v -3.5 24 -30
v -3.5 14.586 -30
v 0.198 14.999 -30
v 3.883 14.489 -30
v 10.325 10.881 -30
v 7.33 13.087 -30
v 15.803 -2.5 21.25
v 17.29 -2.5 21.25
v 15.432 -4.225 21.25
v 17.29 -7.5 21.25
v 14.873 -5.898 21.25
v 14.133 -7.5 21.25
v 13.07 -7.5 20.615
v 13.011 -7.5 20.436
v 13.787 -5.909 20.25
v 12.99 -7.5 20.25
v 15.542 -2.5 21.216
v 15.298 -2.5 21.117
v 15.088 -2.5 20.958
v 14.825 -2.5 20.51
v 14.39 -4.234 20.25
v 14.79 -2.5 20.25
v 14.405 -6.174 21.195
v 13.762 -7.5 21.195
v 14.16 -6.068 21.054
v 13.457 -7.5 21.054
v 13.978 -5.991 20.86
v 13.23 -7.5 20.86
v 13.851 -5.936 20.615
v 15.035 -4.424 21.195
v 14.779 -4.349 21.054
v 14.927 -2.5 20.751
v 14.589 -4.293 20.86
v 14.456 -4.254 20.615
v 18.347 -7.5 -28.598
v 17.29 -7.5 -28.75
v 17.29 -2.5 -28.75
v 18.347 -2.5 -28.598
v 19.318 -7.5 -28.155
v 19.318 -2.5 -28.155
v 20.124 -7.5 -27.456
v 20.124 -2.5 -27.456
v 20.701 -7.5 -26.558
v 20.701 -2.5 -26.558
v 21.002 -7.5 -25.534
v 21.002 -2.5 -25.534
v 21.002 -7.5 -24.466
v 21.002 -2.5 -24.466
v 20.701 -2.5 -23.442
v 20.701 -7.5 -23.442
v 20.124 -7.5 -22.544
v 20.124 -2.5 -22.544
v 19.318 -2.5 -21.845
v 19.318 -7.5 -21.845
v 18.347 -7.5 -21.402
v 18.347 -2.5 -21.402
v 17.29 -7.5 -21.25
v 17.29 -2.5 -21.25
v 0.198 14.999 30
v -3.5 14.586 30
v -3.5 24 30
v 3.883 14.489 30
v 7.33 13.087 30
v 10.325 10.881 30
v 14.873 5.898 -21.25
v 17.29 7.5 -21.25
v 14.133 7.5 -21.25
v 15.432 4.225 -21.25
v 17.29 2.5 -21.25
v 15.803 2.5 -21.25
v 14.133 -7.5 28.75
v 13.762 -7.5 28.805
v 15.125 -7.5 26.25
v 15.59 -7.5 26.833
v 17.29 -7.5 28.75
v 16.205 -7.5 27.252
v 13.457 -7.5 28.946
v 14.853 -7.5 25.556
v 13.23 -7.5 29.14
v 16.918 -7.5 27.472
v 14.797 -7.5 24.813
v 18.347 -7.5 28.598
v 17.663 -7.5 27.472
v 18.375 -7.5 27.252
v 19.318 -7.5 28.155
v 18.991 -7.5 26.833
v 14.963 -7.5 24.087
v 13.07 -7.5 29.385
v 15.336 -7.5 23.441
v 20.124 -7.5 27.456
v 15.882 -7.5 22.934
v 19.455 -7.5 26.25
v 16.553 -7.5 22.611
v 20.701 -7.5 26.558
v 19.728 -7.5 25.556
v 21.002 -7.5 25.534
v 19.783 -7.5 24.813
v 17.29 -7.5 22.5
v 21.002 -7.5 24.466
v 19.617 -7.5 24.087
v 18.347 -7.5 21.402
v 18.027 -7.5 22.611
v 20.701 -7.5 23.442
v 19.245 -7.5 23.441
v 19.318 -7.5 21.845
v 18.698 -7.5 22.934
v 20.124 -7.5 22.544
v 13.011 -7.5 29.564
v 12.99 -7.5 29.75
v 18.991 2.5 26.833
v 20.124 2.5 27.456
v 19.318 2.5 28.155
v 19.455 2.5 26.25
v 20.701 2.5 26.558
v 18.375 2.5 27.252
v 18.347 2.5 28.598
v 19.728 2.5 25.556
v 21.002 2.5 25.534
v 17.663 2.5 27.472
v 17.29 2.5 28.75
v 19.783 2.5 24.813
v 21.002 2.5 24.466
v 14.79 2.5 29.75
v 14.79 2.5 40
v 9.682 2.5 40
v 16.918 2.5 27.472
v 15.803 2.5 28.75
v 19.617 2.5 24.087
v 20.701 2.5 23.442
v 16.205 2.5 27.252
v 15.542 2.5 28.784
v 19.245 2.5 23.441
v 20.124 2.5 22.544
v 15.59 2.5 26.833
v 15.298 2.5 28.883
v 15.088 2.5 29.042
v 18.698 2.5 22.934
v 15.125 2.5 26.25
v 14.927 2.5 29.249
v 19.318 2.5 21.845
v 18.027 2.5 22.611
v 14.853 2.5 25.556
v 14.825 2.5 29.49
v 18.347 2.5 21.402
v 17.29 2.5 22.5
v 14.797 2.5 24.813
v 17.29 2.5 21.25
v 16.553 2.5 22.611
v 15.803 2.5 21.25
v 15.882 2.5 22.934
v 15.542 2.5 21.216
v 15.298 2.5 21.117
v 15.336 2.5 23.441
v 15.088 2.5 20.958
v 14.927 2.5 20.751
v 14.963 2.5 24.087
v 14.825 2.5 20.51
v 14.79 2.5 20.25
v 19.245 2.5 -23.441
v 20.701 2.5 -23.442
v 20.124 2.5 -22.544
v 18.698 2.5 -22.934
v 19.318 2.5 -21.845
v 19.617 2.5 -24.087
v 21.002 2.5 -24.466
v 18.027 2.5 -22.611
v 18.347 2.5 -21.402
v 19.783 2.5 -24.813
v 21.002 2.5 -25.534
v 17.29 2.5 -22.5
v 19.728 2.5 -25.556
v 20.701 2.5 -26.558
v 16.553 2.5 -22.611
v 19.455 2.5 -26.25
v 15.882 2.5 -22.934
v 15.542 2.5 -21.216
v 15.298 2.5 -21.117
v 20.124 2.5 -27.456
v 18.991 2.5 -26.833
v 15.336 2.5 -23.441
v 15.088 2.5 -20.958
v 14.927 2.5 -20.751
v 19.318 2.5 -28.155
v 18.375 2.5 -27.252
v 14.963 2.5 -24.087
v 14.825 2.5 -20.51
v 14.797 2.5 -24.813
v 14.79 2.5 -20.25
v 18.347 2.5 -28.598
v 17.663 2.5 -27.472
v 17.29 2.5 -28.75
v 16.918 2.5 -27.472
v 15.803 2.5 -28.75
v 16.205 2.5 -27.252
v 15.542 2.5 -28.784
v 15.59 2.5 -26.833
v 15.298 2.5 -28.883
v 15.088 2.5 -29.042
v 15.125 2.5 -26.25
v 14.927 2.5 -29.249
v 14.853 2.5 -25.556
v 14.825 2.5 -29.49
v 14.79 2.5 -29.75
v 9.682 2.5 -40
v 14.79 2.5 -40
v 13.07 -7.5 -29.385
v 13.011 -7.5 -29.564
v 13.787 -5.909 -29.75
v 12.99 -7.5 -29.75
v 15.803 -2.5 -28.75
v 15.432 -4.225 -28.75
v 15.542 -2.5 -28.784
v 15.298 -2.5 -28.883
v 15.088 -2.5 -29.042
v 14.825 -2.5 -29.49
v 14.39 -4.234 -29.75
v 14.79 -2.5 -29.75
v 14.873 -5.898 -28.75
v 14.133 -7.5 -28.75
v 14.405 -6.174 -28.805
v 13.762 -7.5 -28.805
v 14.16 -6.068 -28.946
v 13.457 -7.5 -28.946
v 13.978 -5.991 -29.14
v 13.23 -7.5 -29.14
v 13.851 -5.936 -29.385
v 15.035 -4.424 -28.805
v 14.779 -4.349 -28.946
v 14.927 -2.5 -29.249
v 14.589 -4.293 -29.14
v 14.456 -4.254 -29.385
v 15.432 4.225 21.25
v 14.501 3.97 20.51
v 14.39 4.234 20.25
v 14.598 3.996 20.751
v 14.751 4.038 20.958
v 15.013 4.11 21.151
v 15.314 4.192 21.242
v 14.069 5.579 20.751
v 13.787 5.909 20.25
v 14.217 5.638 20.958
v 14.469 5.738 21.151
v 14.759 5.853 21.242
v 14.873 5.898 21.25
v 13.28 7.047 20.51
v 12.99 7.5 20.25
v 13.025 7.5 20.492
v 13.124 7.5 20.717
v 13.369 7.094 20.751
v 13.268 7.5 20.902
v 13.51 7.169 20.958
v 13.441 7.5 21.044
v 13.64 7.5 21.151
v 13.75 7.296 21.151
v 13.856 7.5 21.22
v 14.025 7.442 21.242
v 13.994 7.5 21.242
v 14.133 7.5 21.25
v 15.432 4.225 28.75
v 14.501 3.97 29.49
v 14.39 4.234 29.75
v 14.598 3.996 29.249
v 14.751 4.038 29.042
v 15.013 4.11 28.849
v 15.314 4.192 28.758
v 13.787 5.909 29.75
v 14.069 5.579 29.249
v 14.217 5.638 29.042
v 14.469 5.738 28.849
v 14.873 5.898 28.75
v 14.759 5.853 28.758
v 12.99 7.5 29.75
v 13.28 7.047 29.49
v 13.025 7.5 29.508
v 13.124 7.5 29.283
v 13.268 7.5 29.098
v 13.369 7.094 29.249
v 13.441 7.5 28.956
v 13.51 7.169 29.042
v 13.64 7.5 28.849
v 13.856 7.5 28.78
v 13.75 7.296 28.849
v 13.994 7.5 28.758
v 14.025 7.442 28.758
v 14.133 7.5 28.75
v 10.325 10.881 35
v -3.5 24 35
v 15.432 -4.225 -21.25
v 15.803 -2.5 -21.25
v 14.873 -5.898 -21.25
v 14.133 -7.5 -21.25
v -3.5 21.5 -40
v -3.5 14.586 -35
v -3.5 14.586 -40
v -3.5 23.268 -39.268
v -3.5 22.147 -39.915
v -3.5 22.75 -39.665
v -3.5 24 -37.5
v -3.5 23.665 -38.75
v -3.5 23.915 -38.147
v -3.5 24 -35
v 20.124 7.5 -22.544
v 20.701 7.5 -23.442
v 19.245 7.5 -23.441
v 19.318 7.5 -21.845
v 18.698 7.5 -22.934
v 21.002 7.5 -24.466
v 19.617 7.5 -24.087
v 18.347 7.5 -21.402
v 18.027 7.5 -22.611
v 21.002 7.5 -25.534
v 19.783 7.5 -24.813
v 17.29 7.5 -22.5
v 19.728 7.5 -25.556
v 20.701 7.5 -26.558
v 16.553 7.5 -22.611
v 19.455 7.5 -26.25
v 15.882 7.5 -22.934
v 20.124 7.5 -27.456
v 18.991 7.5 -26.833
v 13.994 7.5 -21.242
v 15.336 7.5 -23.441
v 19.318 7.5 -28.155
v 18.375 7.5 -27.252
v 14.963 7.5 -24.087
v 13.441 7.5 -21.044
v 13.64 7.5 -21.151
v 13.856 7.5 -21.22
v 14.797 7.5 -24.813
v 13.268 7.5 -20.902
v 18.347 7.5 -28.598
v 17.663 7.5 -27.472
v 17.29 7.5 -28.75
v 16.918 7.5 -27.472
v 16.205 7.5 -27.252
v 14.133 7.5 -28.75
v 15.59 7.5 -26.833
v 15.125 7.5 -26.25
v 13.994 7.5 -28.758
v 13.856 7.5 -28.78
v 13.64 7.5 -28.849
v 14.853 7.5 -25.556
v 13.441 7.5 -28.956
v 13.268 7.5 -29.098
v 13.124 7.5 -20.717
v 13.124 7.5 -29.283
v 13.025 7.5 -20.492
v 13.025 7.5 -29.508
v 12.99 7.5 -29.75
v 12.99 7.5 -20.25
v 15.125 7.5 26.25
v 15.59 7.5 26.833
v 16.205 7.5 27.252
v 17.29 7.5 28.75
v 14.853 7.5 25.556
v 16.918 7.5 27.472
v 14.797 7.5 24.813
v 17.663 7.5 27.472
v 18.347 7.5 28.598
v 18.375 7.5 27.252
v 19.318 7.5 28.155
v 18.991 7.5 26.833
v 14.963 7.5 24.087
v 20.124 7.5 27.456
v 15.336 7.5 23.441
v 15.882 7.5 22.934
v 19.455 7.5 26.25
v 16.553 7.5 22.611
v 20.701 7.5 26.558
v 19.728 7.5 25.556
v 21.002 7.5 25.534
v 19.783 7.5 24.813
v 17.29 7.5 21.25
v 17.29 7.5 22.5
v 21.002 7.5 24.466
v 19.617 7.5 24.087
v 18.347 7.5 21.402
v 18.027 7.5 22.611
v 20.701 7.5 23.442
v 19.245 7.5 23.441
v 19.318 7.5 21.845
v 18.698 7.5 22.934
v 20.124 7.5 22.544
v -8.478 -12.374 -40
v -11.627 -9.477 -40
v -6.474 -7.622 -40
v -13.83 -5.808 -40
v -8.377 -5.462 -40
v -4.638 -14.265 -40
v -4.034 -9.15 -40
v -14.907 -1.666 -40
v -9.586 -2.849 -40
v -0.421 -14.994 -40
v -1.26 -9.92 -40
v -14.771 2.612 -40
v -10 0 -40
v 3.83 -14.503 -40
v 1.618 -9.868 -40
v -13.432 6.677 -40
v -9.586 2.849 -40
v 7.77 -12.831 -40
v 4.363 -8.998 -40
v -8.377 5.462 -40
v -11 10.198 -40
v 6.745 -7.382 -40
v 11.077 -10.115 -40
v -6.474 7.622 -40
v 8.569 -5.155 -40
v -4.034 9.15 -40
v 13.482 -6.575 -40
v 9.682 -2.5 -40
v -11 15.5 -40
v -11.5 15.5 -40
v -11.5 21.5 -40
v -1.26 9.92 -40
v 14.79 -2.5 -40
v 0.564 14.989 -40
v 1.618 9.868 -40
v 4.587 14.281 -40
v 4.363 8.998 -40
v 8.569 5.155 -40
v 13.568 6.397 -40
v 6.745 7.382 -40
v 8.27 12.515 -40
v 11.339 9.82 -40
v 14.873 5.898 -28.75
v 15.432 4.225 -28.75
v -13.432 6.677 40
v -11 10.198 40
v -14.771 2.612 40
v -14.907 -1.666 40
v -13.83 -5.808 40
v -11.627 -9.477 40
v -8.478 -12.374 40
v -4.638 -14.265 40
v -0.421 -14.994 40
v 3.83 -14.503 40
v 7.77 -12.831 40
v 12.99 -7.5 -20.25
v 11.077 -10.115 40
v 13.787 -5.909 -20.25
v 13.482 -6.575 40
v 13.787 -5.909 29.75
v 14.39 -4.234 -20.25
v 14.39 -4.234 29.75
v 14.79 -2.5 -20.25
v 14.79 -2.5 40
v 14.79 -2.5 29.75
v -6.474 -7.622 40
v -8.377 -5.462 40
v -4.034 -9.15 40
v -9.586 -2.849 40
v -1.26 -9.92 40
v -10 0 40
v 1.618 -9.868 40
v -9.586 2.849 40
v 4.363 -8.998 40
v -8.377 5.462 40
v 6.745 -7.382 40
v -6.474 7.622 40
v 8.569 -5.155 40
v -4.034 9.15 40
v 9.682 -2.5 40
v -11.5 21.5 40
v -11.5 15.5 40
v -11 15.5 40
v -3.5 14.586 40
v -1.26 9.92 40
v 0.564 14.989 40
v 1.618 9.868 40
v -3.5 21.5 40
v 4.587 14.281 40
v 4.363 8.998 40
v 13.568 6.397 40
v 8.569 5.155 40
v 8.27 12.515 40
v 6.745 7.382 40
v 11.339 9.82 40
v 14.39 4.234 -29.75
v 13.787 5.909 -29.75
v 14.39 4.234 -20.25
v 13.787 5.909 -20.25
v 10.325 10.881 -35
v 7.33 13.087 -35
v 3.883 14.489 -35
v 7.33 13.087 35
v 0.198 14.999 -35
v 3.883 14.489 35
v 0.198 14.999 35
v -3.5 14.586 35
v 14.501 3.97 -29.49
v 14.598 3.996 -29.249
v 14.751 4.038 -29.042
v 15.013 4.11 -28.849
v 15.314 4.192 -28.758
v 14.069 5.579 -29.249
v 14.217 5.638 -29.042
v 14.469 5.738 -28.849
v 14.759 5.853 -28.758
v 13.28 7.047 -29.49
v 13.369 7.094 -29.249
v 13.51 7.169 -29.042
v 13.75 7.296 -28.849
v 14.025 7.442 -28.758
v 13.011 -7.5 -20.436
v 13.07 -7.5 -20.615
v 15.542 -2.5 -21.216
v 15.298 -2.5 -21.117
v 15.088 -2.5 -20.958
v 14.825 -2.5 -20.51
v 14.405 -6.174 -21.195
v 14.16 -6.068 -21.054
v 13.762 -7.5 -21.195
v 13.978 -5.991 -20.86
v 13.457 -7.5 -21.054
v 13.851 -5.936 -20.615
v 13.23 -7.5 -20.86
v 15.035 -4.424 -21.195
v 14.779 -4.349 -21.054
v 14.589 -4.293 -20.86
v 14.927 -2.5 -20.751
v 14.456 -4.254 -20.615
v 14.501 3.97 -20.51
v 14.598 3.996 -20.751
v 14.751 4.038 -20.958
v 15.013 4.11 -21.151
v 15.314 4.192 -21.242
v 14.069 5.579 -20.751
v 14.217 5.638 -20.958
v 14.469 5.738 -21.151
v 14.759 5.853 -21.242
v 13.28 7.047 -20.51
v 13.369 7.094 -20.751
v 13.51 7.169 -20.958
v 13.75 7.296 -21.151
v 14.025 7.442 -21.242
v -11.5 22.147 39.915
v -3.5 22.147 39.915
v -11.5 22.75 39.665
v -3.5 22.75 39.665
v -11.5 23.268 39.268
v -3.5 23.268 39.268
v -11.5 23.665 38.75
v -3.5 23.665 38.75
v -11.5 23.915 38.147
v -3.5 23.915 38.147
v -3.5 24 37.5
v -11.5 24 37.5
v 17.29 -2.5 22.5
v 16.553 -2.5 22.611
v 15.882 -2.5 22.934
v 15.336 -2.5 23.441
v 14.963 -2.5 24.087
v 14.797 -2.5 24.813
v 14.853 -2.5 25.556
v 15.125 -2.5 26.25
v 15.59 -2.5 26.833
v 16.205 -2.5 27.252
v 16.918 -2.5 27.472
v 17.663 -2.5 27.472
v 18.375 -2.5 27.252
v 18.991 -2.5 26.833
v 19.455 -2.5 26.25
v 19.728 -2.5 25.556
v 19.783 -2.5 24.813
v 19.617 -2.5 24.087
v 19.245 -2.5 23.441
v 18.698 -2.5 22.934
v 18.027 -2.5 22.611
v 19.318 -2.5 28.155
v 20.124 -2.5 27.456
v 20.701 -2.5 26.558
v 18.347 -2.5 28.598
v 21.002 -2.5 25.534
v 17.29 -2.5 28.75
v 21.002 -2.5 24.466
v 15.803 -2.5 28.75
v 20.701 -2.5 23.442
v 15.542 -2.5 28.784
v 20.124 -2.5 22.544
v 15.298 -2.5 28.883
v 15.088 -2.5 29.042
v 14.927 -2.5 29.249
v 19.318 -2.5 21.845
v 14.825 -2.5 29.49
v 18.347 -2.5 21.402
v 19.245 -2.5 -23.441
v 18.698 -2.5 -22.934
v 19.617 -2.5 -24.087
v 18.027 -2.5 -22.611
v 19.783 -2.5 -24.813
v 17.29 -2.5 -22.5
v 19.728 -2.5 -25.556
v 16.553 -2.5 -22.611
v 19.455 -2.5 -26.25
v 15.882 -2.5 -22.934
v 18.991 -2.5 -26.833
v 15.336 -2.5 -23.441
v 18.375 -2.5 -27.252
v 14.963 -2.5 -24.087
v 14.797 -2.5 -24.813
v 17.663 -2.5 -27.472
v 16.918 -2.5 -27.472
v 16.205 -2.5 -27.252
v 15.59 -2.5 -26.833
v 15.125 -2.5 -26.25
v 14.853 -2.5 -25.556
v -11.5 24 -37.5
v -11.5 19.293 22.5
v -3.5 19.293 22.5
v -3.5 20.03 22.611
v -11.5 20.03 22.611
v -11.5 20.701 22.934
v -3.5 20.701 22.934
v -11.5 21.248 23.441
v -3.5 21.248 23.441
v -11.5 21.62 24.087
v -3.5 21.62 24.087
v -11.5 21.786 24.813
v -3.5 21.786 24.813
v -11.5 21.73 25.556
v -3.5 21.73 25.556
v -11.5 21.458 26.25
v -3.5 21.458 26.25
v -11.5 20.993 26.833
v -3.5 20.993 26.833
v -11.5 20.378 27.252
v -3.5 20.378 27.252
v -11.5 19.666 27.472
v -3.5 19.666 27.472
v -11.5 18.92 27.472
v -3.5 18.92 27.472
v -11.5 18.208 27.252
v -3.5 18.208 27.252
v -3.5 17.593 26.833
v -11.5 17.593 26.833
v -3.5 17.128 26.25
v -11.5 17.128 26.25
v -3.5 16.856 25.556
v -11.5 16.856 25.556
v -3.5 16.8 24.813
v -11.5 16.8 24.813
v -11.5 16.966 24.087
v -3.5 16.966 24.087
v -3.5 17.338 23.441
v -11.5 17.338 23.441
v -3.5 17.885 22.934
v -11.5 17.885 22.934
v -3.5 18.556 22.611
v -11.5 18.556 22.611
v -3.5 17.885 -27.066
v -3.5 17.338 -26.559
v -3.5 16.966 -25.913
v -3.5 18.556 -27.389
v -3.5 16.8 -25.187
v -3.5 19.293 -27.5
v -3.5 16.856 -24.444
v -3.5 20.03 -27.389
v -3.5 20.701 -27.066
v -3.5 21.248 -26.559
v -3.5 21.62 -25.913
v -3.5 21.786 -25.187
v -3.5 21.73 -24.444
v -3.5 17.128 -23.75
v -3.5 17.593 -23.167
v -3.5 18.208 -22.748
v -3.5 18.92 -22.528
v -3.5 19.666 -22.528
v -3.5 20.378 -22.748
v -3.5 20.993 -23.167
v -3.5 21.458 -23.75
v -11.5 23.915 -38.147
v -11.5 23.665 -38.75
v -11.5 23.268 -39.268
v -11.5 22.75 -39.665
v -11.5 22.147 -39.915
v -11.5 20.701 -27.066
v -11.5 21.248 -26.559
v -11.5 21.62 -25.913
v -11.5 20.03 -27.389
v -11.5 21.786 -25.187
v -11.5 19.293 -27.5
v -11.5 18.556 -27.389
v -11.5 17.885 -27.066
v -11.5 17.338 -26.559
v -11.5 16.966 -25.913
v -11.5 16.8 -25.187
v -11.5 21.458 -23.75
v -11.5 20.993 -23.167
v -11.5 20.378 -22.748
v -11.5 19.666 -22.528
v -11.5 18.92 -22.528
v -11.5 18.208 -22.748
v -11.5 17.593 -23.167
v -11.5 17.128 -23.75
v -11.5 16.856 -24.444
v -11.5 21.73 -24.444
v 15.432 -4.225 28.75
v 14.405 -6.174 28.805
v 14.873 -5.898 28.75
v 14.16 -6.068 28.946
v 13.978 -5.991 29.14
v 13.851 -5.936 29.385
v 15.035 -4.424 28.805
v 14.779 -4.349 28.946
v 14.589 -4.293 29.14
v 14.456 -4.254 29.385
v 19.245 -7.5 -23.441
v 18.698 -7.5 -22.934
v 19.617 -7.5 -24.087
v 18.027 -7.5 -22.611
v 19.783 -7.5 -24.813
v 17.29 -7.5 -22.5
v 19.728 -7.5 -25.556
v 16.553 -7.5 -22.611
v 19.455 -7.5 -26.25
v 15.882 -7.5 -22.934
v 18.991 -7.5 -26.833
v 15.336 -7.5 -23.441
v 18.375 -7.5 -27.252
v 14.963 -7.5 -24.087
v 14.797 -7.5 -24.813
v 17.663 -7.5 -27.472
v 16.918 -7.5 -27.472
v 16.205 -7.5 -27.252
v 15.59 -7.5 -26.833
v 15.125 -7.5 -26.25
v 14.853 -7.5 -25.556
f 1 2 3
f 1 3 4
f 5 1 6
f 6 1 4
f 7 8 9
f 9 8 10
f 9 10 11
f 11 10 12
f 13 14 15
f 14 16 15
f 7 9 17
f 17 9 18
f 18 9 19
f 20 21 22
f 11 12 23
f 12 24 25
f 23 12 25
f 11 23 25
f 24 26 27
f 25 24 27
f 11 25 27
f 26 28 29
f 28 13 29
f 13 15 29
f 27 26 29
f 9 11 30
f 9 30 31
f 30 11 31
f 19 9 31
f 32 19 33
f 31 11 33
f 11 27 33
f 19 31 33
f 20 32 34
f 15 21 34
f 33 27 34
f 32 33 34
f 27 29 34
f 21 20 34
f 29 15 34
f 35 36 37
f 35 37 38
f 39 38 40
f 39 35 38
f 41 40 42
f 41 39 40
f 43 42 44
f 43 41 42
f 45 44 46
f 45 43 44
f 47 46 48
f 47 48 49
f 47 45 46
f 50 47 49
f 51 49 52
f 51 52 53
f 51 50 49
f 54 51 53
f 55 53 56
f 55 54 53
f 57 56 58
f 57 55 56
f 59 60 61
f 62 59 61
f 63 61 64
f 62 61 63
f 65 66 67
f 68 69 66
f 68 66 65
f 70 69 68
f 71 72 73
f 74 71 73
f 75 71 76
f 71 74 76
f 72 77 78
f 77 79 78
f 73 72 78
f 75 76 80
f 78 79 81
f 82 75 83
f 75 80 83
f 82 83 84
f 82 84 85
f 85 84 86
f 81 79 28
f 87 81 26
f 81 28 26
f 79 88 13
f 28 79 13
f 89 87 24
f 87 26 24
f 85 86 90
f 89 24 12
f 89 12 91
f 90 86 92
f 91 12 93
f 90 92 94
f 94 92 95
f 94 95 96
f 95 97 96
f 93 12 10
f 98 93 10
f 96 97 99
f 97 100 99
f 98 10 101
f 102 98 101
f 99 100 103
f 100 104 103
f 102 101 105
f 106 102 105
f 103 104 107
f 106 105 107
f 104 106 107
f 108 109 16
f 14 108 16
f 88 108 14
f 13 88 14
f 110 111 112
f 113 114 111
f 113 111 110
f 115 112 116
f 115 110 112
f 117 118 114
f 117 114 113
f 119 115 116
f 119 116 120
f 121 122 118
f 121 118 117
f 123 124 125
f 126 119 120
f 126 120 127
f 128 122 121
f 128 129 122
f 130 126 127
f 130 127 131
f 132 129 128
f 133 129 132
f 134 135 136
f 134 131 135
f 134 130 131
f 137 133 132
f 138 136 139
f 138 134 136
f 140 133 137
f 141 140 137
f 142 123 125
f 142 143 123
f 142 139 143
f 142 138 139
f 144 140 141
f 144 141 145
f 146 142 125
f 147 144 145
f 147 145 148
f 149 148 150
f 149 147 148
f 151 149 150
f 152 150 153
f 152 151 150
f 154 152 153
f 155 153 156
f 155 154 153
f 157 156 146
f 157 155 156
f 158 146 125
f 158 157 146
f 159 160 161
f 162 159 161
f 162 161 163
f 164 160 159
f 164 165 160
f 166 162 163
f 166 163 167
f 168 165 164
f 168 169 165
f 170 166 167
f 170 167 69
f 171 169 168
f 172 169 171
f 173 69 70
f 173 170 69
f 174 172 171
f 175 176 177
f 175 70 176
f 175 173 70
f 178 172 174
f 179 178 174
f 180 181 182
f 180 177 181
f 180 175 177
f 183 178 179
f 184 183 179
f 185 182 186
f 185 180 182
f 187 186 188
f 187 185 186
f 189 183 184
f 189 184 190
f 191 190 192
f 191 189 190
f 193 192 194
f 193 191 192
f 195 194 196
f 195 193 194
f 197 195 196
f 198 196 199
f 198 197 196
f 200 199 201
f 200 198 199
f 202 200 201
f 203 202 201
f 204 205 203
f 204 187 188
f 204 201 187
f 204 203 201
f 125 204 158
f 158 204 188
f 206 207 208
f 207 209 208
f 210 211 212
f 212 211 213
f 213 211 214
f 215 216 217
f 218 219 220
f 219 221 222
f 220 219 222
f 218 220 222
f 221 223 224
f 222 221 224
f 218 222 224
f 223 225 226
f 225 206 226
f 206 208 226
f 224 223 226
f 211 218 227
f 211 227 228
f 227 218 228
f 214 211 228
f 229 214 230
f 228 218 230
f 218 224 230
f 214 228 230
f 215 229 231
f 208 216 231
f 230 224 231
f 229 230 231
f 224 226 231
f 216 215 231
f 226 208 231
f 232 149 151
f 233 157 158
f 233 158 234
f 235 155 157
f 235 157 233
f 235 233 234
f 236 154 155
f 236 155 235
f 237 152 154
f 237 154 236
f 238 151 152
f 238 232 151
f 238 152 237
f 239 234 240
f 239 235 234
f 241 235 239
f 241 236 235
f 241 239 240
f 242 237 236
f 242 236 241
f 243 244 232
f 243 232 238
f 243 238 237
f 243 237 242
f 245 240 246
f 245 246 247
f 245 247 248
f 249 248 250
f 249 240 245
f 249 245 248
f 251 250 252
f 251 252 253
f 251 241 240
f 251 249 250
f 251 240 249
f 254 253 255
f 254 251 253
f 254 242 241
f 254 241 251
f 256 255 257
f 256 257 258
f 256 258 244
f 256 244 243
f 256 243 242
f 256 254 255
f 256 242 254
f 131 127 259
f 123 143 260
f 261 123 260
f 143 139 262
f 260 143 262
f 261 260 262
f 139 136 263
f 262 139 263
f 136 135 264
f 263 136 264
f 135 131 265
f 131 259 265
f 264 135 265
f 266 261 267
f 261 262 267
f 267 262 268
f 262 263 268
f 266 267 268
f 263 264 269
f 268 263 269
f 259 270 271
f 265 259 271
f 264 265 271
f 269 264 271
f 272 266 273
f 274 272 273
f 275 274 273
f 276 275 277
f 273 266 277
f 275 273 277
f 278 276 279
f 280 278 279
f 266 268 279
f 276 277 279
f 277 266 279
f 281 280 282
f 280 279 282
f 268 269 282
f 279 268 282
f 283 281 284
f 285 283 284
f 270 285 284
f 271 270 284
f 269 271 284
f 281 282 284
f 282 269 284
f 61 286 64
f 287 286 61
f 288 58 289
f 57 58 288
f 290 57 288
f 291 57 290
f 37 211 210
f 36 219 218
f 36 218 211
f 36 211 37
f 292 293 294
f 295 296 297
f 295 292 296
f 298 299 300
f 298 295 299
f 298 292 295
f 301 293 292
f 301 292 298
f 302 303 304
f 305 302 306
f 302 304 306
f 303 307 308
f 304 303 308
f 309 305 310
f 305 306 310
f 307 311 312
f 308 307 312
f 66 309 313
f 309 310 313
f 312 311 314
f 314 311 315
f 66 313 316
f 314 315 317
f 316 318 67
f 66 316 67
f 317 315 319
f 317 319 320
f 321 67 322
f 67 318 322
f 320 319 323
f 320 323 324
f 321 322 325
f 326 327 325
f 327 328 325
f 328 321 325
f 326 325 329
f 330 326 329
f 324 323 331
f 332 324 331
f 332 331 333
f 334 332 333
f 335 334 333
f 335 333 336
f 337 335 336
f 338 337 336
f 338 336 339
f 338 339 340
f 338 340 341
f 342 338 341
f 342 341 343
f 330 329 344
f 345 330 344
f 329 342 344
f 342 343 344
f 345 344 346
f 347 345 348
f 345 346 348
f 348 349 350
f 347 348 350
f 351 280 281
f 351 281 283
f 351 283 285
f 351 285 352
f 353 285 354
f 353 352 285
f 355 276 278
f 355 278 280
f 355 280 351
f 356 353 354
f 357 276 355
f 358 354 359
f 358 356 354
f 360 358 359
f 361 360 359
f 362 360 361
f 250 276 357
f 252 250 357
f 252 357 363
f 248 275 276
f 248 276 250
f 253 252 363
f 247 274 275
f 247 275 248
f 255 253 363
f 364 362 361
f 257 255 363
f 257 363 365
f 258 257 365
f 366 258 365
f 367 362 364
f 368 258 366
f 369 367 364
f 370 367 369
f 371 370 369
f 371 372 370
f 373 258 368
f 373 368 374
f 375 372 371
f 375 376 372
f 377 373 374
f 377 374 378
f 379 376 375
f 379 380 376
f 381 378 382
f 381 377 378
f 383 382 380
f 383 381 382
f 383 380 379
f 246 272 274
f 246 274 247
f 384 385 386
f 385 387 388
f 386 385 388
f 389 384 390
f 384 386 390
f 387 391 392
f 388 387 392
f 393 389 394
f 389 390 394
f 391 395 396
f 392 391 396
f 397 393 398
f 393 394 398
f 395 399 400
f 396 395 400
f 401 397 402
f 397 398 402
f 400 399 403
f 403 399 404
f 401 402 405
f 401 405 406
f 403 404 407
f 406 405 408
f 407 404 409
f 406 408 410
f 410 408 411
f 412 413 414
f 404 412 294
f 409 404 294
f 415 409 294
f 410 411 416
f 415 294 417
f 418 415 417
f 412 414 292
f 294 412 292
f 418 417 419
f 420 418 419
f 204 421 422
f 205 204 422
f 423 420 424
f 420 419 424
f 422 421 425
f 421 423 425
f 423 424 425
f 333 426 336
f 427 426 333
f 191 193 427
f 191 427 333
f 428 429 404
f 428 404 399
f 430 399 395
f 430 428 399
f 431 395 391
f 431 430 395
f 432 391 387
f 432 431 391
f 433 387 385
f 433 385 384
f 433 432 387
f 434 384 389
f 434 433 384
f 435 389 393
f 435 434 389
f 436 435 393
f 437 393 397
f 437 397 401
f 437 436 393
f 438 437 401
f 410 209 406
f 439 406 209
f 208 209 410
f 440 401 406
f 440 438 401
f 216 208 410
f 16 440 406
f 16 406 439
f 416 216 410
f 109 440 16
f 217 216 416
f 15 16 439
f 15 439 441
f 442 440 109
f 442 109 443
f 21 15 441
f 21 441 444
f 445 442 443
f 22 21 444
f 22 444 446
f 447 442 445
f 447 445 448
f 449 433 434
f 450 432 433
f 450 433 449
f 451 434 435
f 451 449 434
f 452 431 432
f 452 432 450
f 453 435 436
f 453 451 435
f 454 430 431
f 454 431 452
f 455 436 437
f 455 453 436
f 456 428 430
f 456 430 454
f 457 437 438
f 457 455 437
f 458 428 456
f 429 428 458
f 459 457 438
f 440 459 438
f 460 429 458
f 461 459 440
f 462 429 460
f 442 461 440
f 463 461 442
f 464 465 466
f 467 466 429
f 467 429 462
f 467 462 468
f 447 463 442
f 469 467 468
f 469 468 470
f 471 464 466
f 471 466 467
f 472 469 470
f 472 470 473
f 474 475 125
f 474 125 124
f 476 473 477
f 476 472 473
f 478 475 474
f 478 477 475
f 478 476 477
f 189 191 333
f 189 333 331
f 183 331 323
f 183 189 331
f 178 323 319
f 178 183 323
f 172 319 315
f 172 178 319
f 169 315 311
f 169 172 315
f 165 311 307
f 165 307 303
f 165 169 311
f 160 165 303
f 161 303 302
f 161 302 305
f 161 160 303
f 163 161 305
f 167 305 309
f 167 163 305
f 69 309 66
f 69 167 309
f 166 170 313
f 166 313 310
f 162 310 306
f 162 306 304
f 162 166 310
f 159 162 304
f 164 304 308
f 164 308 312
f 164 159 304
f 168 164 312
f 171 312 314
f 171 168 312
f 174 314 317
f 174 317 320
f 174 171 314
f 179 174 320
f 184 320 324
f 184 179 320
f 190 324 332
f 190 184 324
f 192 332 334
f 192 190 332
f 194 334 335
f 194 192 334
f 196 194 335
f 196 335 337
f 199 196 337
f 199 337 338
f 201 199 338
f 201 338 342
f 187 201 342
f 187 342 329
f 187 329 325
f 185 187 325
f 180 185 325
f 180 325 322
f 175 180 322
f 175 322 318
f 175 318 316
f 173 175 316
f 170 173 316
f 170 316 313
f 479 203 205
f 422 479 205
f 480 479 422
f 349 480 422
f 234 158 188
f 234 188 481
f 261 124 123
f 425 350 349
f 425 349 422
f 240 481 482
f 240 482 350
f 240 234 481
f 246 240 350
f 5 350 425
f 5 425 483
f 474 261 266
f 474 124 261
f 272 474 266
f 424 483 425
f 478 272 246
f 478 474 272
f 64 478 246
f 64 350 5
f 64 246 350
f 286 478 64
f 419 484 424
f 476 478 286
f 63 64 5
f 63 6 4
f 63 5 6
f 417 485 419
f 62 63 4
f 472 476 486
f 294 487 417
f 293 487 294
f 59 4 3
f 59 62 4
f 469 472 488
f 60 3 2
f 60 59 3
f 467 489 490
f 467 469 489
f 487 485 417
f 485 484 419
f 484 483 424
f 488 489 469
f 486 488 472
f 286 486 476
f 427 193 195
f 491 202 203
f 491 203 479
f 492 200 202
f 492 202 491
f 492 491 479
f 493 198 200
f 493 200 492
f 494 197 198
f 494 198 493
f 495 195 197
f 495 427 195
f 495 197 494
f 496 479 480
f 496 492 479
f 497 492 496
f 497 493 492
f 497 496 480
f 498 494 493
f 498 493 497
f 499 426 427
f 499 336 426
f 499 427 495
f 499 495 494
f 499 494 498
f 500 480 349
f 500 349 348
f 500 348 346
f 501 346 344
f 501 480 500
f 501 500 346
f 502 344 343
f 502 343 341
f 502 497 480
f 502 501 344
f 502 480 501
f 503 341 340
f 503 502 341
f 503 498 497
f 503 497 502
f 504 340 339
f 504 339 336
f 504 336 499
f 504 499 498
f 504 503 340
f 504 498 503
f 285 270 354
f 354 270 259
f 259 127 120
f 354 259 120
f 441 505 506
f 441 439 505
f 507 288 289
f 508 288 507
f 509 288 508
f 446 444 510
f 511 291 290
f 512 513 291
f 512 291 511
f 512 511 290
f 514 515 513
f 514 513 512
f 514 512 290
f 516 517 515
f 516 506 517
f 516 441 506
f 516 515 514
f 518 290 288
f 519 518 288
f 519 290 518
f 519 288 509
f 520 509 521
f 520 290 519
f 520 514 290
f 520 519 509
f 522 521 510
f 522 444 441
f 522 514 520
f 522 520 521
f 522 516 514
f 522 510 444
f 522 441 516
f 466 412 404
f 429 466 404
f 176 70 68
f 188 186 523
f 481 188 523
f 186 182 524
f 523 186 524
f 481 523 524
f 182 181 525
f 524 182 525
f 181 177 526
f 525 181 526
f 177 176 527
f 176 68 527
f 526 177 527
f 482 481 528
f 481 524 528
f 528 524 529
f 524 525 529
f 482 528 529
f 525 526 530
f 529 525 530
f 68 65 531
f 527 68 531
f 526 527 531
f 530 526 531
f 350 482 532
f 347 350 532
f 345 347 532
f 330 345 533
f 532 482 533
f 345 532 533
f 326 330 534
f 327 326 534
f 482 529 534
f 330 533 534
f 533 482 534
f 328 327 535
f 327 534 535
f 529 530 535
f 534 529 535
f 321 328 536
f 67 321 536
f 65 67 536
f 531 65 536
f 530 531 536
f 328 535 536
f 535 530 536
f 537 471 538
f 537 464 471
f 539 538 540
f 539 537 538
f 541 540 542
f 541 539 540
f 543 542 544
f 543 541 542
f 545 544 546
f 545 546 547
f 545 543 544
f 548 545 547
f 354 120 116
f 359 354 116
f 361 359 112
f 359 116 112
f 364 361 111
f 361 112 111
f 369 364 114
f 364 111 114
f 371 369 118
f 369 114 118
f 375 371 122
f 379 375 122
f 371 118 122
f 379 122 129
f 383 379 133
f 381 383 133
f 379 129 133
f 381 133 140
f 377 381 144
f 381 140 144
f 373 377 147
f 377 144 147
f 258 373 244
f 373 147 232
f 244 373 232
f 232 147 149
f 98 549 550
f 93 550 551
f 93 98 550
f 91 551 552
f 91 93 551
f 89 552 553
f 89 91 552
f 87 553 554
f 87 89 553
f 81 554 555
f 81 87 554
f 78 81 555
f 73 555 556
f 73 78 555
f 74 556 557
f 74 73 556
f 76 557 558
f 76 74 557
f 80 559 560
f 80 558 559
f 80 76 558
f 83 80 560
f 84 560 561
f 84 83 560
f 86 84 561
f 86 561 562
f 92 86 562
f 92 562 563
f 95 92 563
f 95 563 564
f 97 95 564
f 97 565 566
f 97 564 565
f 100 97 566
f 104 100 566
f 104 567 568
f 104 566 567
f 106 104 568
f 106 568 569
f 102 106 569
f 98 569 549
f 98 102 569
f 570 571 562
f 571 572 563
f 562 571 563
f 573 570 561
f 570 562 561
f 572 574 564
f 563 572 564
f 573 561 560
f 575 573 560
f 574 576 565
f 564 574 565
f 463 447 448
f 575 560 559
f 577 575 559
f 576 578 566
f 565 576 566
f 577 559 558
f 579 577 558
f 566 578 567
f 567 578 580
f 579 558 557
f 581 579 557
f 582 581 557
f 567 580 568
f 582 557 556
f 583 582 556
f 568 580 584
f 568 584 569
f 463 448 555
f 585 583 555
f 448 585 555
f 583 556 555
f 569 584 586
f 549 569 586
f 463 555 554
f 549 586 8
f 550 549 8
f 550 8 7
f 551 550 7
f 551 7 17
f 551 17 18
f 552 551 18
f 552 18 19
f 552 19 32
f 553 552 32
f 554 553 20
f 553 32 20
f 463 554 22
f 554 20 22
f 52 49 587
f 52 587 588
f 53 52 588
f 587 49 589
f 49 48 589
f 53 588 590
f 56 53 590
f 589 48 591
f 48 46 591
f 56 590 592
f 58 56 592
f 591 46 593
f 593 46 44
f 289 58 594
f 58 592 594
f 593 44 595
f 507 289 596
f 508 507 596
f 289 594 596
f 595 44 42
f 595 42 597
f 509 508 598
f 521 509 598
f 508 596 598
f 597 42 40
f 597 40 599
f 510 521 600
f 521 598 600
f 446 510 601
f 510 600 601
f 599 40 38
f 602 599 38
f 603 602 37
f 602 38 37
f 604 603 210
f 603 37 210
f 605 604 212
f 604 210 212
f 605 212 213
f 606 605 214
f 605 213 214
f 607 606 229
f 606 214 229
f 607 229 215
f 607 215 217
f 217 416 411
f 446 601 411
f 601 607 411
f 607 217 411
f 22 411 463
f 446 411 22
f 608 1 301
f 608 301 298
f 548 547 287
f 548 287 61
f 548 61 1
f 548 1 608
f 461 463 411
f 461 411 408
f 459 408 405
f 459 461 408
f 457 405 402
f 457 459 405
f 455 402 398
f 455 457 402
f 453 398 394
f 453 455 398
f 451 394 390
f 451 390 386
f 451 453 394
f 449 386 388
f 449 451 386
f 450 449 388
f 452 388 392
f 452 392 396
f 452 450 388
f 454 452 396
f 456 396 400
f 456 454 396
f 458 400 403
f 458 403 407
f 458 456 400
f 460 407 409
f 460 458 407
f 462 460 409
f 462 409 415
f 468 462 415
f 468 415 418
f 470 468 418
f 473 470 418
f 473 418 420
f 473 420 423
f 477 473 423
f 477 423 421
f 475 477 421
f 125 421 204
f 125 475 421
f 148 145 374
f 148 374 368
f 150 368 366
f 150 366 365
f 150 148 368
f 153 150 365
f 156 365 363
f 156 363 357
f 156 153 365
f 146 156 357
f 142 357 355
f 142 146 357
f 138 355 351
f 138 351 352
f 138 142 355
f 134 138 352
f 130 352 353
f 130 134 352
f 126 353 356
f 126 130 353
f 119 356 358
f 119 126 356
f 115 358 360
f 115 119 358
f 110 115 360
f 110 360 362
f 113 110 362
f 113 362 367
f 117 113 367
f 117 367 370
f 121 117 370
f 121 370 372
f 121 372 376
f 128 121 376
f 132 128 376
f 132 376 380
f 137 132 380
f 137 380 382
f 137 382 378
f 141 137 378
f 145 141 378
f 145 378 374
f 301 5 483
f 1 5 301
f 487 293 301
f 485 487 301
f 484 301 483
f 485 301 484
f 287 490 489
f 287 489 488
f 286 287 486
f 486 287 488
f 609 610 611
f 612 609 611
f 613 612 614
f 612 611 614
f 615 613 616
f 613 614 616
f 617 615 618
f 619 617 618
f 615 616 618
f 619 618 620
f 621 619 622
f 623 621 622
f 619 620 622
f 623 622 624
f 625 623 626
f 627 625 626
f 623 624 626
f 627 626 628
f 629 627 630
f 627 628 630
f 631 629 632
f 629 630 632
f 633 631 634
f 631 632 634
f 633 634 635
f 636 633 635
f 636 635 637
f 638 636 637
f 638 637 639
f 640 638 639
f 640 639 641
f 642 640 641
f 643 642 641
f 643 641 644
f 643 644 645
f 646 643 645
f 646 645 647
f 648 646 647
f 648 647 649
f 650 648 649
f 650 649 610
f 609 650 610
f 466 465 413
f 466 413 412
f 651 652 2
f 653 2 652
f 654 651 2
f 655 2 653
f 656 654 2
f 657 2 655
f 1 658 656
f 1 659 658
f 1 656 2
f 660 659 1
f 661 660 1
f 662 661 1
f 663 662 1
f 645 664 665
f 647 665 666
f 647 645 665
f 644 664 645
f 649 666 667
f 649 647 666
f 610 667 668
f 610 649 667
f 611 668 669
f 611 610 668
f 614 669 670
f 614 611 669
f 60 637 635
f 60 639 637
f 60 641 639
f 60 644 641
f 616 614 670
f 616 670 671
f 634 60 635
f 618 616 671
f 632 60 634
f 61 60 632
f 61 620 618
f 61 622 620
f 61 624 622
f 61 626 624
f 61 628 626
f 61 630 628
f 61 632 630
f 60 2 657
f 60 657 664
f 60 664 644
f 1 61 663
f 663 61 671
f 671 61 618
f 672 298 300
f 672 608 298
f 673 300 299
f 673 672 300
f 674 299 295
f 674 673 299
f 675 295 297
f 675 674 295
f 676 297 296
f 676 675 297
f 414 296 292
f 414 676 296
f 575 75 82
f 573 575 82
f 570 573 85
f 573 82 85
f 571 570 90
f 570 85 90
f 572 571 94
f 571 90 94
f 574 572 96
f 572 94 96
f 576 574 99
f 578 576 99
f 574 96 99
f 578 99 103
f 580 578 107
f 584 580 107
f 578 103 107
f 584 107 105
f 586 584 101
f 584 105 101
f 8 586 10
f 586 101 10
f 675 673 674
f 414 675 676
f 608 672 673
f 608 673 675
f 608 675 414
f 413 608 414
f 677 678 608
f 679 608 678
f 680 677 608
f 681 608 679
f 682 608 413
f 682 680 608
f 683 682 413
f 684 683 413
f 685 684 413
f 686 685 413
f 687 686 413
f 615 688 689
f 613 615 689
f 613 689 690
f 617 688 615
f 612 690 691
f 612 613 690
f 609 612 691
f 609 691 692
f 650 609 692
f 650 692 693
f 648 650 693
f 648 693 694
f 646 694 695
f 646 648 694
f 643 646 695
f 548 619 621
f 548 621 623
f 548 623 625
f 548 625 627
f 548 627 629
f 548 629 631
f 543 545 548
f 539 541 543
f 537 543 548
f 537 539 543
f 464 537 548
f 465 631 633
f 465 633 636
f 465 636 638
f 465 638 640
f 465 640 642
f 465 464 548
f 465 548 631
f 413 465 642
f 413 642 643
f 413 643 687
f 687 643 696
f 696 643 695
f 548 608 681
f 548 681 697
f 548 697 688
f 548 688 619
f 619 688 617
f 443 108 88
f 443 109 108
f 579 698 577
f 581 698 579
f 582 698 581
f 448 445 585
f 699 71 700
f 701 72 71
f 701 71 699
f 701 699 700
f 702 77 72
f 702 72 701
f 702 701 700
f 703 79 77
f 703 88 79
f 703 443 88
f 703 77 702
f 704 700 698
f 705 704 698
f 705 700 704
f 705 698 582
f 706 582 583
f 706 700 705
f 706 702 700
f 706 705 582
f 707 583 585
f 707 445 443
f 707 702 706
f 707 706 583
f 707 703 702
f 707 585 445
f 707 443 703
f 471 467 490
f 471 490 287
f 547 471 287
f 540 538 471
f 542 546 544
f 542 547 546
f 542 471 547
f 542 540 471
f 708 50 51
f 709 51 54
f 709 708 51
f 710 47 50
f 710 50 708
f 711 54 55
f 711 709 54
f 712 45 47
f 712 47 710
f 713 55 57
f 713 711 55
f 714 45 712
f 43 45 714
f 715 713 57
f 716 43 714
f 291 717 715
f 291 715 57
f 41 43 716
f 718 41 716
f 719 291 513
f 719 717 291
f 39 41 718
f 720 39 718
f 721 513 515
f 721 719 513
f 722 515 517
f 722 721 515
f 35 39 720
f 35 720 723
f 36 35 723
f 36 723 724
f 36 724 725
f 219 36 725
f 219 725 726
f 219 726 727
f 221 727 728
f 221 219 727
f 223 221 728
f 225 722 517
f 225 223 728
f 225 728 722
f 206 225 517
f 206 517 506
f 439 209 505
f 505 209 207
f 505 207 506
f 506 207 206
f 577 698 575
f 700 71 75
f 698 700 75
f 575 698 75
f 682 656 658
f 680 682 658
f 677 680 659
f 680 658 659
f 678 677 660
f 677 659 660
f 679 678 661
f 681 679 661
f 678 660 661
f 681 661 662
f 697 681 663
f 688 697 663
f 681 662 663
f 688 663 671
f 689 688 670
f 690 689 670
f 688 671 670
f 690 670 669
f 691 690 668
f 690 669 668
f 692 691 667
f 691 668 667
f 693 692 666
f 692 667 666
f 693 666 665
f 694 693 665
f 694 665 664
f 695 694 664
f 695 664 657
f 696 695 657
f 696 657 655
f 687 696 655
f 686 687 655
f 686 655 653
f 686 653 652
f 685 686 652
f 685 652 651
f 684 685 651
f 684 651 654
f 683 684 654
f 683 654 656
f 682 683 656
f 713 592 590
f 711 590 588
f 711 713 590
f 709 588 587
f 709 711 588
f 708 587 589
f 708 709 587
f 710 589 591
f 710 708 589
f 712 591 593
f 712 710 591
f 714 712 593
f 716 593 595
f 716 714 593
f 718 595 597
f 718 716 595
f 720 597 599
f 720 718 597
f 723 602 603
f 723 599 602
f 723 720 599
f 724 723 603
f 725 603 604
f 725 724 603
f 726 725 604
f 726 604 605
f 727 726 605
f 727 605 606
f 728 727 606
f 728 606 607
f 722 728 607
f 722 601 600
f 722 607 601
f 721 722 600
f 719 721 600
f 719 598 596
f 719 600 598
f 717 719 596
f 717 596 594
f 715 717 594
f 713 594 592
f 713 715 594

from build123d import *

# Parameters (mm, degrees)
BOSS_EXTRUDE1_DEPTH = 40
BOSS_EXTRUDE2_START = 30
BOSS_EXTRUDE2_DEPTH = 5
BOSS_EXTRUDE3_START = -35
BOSS_EXTRUDE3_DEPTH = 5
SKETCH2_R           = 2.5
CUT_EXTRUDE1_DEPTH  = 15
BOSS_EXTRUDE4_START = 2.5
SKETCH4_R           = 2.5
BOSS_EXTRUDE4_DEPTH = 5
BOSS_EXTRUDE5_START = -7.5
SKETCH4_2_R         = 2.5
BOSS_EXTRUDE5_DEPTH = 5
FILLET1_R           = 1
FILLET2_R           = 2.5


with BuildPart() as part:
    # Sketch1 → Boss-Extrude1 (new, symmetric)
    with BuildSketch(Plane.XY):
        with BuildLine():
            Line((-3.5, 14.585952146), (-3.5, 24))
            Line((-3.5, 24), (-11, 24))
            Line((-11, 24), (-11.5, 24))
            Line((-11.5, 24), (-11.5, 15.5))
            Line((-11.5, 15.5), (-11, 15.5))
            Line((-11, 15.5), (-11, 10.198039027))
            ThreePointArc((-11, 10.198039027), (-6.625817064, -13.457286065), (14.790199458, -2.5))
            Line((14.790199458, -2.5), (9.682458366, -2.5))
            ThreePointArc((9.682458366, -2.5), (-10, 0), (9.682458366, 2.5))
            Line((9.682458366, 2.5), (14.790199458, 2.5))
            ThreePointArc((14.790199458, 2.5), (13.238381204, 7.053032191), (10.325172425, 10.880754312))
            ThreePointArc((10.325172425, 10.880754312), (3.883022973, 14.488689816), (-3.5, 14.585952146))
        make_face()
    extrude(amount=BOSS_EXTRUDE1_DEPTH, both=True)

    # Sketch1<3> → Boss-Extrude2 (add)
    with BuildSketch(Plane.XY.offset(BOSS_EXTRUDE2_START)):
        with BuildLine():
            Line((10.325172425, 10.880754312), (-3.5, 24))
            Line((-3.5, 24), (-3.5, 14.585952146))
            ThreePointArc((-3.5, 14.585952146), (3.883022973, 14.488689816), (10.325172425, 10.880754312))
        make_face()
    extrude(amount=BOSS_EXTRUDE2_DEPTH)

    # Sketch1<4> → Boss-Extrude3 (add)
    with BuildSketch(Plane.XY.offset(BOSS_EXTRUDE3_START)):
        with BuildLine():
            Line((10.325172425, 10.880754312), (-3.5, 24))
            Line((-3.5, 24), (-3.5, 14.585952146))
            ThreePointArc((-3.5, 14.585952146), (3.883022973, 14.488689816), (10.325172425, 10.880754312))
        make_face()
    extrude(amount=BOSS_EXTRUDE3_DEPTH)

    # Sketch2 → Cut-Extrude1 (cut)
    with BuildSketch(Plane(origin=(0, 0, 0), x_dir=(0, 0, -1), z_dir=(1, 0, 0))):
        with Locations((-25, 19.292976073)):
            Circle(SKETCH2_R)
        with Locations((25, 19.292976073)):
            Circle(SKETCH2_R)
    extrude(amount=-CUT_EXTRUDE1_DEPTH, mode=Mode.SUBTRACT)

    # Sketch4 → Boss-Extrude4 (add)
    # profile 1 of 2: a face of its own
    with BuildSketch(Plane(origin=(0, 0, 0), x_dir=(1, 0, 0), z_dir=(0, 1, 0)).offset(BOSS_EXTRUDE4_START)):
        with BuildLine():
            Line((17.290199458, 21.25), (12.290199458, 21.25))
            Line((12.290199458, 21.25), (12.290199458, 28.75))
            Line((12.290199458, 28.75), (17.290199458, 28.75))
            ThreePointArc((17.290199458, 28.75), (21.040199458, 25), (17.290199458, 21.25))
        make_face()
        with Locations((17.290199458, 25)):
            Circle(SKETCH4_R, mode=Mode.SUBTRACT)
    # profile 2 of 2: a face of its own
    with BuildSketch(Plane(origin=(0, 0, 0), x_dir=(1, 0, 0), z_dir=(0, 1, 0)).offset(BOSS_EXTRUDE4_START)):
        with BuildLine():
            Line((12.290199458, -28.75), (17.290199458, -28.75))
            ThreePointArc((17.290199458, -28.75), (21.040199458, -25), (17.290199458, -21.25))
            Line((17.290199458, -21.25), (12.290199458, -21.25))
            Line((12.290199458, -21.25), (12.290199458, -28.75))
        make_face()
        with Locations((17.290199458, -25)):
            Circle(SKETCH4_R, mode=Mode.SUBTRACT)
    extrude(amount=BOSS_EXTRUDE4_DEPTH)

    # Sketch4<2> → Boss-Extrude5 (add)
    # profile 1 of 2: a face of its own
    with BuildSketch(Plane(origin=(0, 0, 0), x_dir=(1, 0, 0), z_dir=(0, 1, 0)).offset(BOSS_EXTRUDE5_START)):
        with BuildLine():
            Line((17.290199458, 21.25), (12.290199458, 21.25))
            Line((12.290199458, 21.25), (12.290199458, 28.75))
            Line((12.290199458, 28.75), (17.290199458, 28.75))
            ThreePointArc((17.290199458, 28.75), (21.040199458, 25), (17.290199458, 21.25))
        make_face()
        with Locations((17.290199458, 25)):
            Circle(SKETCH4_2_R, mode=Mode.SUBTRACT)
    # profile 2 of 2: a face of its own
    with BuildSketch(Plane(origin=(0, 0, 0), x_dir=(1, 0, 0), z_dir=(0, 1, 0)).offset(BOSS_EXTRUDE5_START)):
        with BuildLine():
            Line((12.290199458, -28.75), (17.290199458, -28.75))
            ThreePointArc((17.290199458, -28.75), (21.040199458, -25), (17.290199458, -21.25))
            Line((17.290199458, -21.25), (12.290199458, -21.25))
            Line((12.290199458, -21.25), (12.290199458, -28.75))
        make_face()
        with Locations((17.290199458, -25)):
            Circle(SKETCH4_2_R, mode=Mode.SUBTRACT)
    extrude(amount=BOSS_EXTRUDE5_DEPTH)

    # Fillet1
    fillet1_edges = [part.edges().sort_by_distance(p)[0] for p in [
        (14.113474534, 5.080338234, 21.25),
        (14.113474534, 5.080338234, 28.75),
        (14.113474534, -5.080338234, -28.75),
        (14.113474534, 5.080338234, -28.75),
        (14.113474534, -5.080338234, 21.25),
        (14.113474534, -5.080338234, 28.75),
        (14.113474534, -5.080338234, -21.25),
        (14.113474534, 5.080338234, -21.25),
    ]]
    fillet(fillet1_edges, radius=FILLET1_R)

    # Fillet2
    fillet2_edges = [part.edges().sort_by_distance(p)[0] for p in [
        (-7.5, 24, -40),
        (-7.5, 24, 40),
    ]]
    fillet(fillet2_edges, radius=FILLET2_R)


solid = part.part
